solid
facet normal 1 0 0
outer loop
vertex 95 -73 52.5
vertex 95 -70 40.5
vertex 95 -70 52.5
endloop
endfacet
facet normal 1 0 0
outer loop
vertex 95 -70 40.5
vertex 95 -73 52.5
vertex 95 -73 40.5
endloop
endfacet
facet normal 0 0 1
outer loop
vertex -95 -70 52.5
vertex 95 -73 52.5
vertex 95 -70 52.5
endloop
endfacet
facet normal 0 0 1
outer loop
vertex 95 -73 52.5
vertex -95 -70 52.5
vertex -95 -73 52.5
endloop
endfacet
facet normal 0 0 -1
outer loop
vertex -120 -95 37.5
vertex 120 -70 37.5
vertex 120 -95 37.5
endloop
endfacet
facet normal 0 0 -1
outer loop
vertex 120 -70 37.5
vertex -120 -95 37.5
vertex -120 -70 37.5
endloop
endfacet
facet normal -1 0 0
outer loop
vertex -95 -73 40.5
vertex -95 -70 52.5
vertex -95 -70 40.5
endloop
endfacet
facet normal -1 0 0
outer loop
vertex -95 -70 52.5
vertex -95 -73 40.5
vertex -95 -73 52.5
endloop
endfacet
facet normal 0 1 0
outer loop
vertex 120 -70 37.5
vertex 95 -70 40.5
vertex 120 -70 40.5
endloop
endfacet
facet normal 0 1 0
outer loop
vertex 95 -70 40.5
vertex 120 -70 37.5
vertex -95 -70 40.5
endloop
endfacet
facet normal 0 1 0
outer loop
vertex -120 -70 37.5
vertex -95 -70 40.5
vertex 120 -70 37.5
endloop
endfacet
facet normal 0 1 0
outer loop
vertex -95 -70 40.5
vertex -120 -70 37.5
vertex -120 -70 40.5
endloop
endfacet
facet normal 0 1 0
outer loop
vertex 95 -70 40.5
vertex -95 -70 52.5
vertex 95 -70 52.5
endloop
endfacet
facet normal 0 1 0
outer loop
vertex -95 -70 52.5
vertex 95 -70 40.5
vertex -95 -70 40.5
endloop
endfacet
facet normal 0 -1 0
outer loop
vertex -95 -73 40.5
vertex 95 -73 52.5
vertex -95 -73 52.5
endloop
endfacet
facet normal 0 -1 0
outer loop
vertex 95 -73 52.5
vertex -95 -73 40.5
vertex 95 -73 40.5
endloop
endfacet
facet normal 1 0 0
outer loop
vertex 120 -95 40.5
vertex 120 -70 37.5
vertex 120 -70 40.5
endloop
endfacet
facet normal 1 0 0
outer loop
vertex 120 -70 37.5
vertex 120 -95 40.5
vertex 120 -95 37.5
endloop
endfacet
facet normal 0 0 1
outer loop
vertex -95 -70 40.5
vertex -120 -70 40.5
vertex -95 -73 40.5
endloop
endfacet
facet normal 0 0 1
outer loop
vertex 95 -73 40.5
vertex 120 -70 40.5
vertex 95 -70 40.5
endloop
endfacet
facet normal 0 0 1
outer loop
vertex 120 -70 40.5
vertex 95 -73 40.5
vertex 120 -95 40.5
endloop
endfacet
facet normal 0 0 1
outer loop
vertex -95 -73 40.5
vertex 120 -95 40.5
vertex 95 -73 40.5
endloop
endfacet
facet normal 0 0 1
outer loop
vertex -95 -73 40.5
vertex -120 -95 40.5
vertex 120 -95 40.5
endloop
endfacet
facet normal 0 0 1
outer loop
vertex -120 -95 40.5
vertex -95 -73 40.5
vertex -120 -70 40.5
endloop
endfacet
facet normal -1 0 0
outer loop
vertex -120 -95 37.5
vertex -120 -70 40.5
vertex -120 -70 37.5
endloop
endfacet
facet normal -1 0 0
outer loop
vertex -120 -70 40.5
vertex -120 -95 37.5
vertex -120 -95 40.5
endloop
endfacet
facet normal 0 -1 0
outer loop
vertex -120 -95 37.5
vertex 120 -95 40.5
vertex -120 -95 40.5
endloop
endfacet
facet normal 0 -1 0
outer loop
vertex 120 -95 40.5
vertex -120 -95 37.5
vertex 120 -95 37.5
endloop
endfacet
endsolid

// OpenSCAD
// 8" = 203.2mm

WALL_THICKNESS = 3;
LIP = 25;   // ~1"
HEIGHT = 75; // ~3"

ID = 205;
OD = ID + WALL_THICKNESS*2;
LIP_OD = OD + LIP*2;

$fn=50;

/*
// front 
resize([0,0,0]){
    difference(){
        union(){
            // main body
            cylinder(r=OD/2,h=HEIGHT);

            // lip
            cylinder(r=LIP_OD/2,h=WALL_THICKNESS);
        }
        
        // hole
        translate([0,0,-1]){
            cylinder(r=ID/2, h=HEIGHT+2);
        }
        
        // delete half
        translate([-LIP_OD/2,-LIP_OD/2,-1]){
            cube([LIP_OD,LIP_OD/2,HEIGHT+2]);
        }
    }
}

// sides
translate([-(ID/2)-WALL_THICKNESS,-70,HEIGHT/2]){
    difference(){
        rotate([-30,0,0]){
            cube([WALL_THICKNESS,75,HEIGHT]);
            translate([-LIP,0,0]){                
                cube([LIP,75,WALL_THICKNESS]);
            }
        }
        translate([-1,67,-HEIGHT/2]){
            cube([WALL_THICKNESS*2,75,HEIGHT*2]);
        }
        translate([-1,0,HEIGHT/2]){
            cube([WALL_THICKNESS*2,75,HEIGHT]);
        }
    }
}

translate([ID/2,-70,HEIGHT/2]){
    difference(){
        rotate([-30,0,0]){
            cube([WALL_THICKNESS,75,HEIGHT]);
            translate([WALL_THICKNESS,0,0]){                
                cube([LIP,75,WALL_THICKNESS]);
            }
        }
        translate([-1,67,-HEIGHT/2]){
            cube([WALL_THICKNESS*2,75,HEIGHT*2]);
        }
        translate([-1,0,HEIGHT/2]){
            cube([WALL_THICKNESS*2,75,HEIGHT]);
        }
    }
}
*/

// back
translate([-190/2,-70-WALL_THICKNESS,HEIGHT/2]){
    cube([190,WALL_THICKNESS,15]);
    translate([-LIP,-LIP+WALL_THICKNESS,0]){
        cube([190+(LIP*2),LIP,WALL_THICKNESS]);
    }
    
    /*
    translate([0,0,0]){
        rotate([0,0,8]){
            cube([WALL_THICKNESS,75,HEIGHT/2]);
            translate([-LIP,0,0]){
                cube([LIP,75,WALL_THICKNESS]);
            }
        }
    }

    translate([190,0,HEIGHT/2]){
        rotate([0,180,-8]){
            cube([WALL_THICKNESS,75,HEIGHT/2]);
            translate([-LIP,0,(HEIGHT/2)-WALL_THICKNESS]){
                cube([LIP,75,WALL_THICKNESS]);
            }
        }
    }
    */
}
